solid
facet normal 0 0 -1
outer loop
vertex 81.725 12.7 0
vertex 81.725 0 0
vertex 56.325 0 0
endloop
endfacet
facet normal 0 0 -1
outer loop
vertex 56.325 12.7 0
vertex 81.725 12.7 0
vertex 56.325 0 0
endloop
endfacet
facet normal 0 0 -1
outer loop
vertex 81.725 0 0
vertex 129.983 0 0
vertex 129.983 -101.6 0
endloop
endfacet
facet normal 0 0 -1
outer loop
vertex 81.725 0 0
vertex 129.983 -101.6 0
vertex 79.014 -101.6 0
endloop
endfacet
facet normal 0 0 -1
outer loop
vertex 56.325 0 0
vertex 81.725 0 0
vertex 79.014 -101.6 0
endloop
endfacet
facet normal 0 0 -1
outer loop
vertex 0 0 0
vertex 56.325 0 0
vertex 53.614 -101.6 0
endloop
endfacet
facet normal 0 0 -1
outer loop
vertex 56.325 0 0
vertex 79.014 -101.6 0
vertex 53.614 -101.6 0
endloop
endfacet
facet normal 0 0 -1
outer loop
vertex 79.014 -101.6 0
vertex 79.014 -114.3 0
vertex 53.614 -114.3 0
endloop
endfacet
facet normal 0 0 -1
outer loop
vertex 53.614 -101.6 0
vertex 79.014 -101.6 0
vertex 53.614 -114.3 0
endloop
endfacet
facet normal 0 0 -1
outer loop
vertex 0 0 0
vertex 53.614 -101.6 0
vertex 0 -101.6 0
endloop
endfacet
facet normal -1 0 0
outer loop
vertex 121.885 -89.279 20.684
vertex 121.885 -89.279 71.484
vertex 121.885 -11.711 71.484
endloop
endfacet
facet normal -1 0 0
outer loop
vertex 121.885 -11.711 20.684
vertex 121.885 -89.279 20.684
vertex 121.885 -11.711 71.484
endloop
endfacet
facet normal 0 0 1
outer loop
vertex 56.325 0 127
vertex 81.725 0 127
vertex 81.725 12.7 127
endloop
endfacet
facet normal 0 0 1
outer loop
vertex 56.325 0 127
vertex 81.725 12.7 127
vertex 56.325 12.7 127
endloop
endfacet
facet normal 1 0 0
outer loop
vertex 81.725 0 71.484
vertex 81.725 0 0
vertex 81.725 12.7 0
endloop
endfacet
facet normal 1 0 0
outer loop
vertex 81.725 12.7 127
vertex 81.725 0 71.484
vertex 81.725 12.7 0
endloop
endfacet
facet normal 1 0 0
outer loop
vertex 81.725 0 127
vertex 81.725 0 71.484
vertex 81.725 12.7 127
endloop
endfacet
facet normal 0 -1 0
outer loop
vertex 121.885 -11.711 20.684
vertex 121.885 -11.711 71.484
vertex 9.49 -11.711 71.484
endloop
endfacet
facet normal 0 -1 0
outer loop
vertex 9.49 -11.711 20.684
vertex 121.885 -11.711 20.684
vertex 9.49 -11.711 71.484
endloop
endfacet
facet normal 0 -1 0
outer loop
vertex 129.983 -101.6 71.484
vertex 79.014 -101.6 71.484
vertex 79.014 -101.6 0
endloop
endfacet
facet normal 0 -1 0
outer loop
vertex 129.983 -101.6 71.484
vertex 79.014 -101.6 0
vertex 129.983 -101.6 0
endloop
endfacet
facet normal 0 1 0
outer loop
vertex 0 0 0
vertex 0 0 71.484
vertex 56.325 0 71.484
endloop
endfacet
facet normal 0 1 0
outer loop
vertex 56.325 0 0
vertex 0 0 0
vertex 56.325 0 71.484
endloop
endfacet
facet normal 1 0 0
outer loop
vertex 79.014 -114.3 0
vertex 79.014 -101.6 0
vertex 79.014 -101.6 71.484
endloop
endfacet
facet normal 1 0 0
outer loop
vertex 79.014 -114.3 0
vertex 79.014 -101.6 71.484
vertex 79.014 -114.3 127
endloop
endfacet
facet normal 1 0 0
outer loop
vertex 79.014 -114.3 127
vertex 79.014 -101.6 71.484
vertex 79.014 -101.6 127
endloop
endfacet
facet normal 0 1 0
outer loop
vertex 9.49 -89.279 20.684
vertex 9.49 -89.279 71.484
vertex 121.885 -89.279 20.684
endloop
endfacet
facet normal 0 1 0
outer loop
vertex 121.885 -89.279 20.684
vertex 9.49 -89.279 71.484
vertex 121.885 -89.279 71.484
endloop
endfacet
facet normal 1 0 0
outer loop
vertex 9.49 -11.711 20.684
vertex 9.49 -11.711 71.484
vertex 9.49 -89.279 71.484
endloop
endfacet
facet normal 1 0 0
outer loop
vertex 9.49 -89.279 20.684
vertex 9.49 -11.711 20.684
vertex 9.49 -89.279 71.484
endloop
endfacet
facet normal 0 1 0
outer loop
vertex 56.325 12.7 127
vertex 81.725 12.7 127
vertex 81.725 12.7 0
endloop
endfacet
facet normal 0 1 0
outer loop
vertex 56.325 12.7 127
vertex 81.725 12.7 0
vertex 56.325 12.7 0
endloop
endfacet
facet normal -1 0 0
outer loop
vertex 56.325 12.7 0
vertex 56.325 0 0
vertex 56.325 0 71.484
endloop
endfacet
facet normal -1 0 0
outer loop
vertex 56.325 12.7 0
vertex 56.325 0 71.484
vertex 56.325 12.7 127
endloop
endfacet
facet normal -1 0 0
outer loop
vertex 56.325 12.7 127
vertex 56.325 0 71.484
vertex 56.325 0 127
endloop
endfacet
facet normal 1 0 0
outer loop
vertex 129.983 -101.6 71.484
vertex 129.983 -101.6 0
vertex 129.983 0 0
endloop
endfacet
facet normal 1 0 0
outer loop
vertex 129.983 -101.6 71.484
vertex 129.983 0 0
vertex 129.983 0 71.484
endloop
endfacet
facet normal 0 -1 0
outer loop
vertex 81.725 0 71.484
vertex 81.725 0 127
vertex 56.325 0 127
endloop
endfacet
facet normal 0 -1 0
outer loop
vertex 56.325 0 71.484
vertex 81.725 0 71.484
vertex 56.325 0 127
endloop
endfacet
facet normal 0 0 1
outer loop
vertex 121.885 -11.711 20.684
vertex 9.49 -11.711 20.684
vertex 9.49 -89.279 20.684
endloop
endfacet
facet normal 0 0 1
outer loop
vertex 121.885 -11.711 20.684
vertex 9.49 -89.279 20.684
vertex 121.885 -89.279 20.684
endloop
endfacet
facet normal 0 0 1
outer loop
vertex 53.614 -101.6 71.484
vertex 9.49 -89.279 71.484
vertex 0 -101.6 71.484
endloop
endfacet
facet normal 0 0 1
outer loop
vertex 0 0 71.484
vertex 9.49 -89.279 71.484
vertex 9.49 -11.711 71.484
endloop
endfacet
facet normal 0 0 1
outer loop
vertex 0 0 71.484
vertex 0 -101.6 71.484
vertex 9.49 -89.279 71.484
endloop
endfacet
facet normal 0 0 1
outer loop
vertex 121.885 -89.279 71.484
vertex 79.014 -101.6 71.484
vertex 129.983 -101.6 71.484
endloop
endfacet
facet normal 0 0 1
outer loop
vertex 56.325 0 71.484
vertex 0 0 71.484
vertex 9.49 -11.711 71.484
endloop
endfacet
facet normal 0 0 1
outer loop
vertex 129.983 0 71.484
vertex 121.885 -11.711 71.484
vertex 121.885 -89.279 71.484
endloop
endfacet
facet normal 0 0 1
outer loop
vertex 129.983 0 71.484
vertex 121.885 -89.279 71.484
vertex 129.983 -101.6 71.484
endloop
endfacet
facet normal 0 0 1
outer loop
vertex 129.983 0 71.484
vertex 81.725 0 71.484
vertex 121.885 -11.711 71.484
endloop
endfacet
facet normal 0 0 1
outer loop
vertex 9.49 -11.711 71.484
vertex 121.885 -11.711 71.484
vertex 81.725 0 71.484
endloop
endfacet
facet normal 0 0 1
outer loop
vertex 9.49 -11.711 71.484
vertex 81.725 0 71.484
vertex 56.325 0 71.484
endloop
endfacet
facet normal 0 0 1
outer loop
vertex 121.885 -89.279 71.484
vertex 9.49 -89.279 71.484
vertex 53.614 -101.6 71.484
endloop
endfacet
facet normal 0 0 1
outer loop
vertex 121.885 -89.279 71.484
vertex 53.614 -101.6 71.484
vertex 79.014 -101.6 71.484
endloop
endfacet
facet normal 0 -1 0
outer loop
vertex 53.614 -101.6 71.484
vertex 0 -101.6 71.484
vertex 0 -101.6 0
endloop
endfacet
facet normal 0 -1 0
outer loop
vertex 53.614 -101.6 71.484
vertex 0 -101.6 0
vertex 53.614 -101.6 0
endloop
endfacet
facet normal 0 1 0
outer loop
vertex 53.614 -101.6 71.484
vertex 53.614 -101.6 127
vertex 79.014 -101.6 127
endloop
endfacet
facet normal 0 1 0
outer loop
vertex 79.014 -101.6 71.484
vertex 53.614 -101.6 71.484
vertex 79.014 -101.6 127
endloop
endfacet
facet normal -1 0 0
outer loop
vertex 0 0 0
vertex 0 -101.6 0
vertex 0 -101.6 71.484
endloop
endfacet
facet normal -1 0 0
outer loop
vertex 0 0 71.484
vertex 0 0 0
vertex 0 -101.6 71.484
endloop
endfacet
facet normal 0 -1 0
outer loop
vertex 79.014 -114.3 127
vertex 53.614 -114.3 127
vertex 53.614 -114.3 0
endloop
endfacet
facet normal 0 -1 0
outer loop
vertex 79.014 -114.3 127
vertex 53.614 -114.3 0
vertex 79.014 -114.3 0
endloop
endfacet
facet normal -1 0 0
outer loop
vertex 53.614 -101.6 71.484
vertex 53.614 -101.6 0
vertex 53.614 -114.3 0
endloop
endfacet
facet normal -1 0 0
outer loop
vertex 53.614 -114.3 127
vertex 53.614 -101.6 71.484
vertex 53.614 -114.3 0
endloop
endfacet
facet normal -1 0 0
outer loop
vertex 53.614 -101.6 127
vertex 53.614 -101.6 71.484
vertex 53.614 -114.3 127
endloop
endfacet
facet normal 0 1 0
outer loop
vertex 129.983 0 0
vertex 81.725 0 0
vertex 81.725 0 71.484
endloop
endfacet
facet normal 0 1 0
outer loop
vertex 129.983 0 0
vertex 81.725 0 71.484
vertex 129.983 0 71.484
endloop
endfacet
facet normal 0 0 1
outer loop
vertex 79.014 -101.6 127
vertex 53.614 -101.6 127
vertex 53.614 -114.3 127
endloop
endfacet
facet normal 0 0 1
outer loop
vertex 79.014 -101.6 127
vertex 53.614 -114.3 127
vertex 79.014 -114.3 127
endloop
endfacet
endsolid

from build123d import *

# Parameters (mm, degrees)
F0_W     = 129.983455
F0_H     = 71.484342
F1_DEPTH = 101.6
F3_DEPTH = 50.8
F4_W     = 25.4
F4_H     = 127
F5_DEPTH = 12.7
F6_W     = 25.4
F6_H     = 127
F7_DEPTH = 12.7


with BuildPart() as f1:
    # F0 (on Front) → F1 (new body)
    with BuildSketch(Plane.XZ):
        with Locations((64.991727, 35.742171)):
            Rectangle(F0_W, F0_H)
    extrude(amount=F1_DEPTH)

    # F2 (on face) → F3 (cut)
    with BuildSketch(Plane.XY.offset(71.484342)):
        Polygon((121.884853, -11.710611), (64.991727, -11.710611), (9.490403, -11.710611), (9.490403, -89.278609), (121.884853, -89.278609), (121.884853, -50.8), align=None)
    extrude(amount=-F3_DEPTH, mode=Mode.SUBTRACT)

    # F4 (on face) → F5 (join)
    with BuildSketch(Plane.XZ.offset(101.6)):
        with Locations((66.31402, 63.5)):
            Rectangle(F4_W, F4_H)
    extrude(amount=F5_DEPTH)

    # F6 (on face) → F7 (join)
    with BuildSketch(Plane(origin=(0, 0, 0), x_dir=(-1, 0, 0), z_dir=(0, 1, 0))):
        with Locations((-69.025247, 63.5)):
            Rectangle(F6_W, F6_H)
    extrude(amount=F7_DEPTH)


solid = f1.part
